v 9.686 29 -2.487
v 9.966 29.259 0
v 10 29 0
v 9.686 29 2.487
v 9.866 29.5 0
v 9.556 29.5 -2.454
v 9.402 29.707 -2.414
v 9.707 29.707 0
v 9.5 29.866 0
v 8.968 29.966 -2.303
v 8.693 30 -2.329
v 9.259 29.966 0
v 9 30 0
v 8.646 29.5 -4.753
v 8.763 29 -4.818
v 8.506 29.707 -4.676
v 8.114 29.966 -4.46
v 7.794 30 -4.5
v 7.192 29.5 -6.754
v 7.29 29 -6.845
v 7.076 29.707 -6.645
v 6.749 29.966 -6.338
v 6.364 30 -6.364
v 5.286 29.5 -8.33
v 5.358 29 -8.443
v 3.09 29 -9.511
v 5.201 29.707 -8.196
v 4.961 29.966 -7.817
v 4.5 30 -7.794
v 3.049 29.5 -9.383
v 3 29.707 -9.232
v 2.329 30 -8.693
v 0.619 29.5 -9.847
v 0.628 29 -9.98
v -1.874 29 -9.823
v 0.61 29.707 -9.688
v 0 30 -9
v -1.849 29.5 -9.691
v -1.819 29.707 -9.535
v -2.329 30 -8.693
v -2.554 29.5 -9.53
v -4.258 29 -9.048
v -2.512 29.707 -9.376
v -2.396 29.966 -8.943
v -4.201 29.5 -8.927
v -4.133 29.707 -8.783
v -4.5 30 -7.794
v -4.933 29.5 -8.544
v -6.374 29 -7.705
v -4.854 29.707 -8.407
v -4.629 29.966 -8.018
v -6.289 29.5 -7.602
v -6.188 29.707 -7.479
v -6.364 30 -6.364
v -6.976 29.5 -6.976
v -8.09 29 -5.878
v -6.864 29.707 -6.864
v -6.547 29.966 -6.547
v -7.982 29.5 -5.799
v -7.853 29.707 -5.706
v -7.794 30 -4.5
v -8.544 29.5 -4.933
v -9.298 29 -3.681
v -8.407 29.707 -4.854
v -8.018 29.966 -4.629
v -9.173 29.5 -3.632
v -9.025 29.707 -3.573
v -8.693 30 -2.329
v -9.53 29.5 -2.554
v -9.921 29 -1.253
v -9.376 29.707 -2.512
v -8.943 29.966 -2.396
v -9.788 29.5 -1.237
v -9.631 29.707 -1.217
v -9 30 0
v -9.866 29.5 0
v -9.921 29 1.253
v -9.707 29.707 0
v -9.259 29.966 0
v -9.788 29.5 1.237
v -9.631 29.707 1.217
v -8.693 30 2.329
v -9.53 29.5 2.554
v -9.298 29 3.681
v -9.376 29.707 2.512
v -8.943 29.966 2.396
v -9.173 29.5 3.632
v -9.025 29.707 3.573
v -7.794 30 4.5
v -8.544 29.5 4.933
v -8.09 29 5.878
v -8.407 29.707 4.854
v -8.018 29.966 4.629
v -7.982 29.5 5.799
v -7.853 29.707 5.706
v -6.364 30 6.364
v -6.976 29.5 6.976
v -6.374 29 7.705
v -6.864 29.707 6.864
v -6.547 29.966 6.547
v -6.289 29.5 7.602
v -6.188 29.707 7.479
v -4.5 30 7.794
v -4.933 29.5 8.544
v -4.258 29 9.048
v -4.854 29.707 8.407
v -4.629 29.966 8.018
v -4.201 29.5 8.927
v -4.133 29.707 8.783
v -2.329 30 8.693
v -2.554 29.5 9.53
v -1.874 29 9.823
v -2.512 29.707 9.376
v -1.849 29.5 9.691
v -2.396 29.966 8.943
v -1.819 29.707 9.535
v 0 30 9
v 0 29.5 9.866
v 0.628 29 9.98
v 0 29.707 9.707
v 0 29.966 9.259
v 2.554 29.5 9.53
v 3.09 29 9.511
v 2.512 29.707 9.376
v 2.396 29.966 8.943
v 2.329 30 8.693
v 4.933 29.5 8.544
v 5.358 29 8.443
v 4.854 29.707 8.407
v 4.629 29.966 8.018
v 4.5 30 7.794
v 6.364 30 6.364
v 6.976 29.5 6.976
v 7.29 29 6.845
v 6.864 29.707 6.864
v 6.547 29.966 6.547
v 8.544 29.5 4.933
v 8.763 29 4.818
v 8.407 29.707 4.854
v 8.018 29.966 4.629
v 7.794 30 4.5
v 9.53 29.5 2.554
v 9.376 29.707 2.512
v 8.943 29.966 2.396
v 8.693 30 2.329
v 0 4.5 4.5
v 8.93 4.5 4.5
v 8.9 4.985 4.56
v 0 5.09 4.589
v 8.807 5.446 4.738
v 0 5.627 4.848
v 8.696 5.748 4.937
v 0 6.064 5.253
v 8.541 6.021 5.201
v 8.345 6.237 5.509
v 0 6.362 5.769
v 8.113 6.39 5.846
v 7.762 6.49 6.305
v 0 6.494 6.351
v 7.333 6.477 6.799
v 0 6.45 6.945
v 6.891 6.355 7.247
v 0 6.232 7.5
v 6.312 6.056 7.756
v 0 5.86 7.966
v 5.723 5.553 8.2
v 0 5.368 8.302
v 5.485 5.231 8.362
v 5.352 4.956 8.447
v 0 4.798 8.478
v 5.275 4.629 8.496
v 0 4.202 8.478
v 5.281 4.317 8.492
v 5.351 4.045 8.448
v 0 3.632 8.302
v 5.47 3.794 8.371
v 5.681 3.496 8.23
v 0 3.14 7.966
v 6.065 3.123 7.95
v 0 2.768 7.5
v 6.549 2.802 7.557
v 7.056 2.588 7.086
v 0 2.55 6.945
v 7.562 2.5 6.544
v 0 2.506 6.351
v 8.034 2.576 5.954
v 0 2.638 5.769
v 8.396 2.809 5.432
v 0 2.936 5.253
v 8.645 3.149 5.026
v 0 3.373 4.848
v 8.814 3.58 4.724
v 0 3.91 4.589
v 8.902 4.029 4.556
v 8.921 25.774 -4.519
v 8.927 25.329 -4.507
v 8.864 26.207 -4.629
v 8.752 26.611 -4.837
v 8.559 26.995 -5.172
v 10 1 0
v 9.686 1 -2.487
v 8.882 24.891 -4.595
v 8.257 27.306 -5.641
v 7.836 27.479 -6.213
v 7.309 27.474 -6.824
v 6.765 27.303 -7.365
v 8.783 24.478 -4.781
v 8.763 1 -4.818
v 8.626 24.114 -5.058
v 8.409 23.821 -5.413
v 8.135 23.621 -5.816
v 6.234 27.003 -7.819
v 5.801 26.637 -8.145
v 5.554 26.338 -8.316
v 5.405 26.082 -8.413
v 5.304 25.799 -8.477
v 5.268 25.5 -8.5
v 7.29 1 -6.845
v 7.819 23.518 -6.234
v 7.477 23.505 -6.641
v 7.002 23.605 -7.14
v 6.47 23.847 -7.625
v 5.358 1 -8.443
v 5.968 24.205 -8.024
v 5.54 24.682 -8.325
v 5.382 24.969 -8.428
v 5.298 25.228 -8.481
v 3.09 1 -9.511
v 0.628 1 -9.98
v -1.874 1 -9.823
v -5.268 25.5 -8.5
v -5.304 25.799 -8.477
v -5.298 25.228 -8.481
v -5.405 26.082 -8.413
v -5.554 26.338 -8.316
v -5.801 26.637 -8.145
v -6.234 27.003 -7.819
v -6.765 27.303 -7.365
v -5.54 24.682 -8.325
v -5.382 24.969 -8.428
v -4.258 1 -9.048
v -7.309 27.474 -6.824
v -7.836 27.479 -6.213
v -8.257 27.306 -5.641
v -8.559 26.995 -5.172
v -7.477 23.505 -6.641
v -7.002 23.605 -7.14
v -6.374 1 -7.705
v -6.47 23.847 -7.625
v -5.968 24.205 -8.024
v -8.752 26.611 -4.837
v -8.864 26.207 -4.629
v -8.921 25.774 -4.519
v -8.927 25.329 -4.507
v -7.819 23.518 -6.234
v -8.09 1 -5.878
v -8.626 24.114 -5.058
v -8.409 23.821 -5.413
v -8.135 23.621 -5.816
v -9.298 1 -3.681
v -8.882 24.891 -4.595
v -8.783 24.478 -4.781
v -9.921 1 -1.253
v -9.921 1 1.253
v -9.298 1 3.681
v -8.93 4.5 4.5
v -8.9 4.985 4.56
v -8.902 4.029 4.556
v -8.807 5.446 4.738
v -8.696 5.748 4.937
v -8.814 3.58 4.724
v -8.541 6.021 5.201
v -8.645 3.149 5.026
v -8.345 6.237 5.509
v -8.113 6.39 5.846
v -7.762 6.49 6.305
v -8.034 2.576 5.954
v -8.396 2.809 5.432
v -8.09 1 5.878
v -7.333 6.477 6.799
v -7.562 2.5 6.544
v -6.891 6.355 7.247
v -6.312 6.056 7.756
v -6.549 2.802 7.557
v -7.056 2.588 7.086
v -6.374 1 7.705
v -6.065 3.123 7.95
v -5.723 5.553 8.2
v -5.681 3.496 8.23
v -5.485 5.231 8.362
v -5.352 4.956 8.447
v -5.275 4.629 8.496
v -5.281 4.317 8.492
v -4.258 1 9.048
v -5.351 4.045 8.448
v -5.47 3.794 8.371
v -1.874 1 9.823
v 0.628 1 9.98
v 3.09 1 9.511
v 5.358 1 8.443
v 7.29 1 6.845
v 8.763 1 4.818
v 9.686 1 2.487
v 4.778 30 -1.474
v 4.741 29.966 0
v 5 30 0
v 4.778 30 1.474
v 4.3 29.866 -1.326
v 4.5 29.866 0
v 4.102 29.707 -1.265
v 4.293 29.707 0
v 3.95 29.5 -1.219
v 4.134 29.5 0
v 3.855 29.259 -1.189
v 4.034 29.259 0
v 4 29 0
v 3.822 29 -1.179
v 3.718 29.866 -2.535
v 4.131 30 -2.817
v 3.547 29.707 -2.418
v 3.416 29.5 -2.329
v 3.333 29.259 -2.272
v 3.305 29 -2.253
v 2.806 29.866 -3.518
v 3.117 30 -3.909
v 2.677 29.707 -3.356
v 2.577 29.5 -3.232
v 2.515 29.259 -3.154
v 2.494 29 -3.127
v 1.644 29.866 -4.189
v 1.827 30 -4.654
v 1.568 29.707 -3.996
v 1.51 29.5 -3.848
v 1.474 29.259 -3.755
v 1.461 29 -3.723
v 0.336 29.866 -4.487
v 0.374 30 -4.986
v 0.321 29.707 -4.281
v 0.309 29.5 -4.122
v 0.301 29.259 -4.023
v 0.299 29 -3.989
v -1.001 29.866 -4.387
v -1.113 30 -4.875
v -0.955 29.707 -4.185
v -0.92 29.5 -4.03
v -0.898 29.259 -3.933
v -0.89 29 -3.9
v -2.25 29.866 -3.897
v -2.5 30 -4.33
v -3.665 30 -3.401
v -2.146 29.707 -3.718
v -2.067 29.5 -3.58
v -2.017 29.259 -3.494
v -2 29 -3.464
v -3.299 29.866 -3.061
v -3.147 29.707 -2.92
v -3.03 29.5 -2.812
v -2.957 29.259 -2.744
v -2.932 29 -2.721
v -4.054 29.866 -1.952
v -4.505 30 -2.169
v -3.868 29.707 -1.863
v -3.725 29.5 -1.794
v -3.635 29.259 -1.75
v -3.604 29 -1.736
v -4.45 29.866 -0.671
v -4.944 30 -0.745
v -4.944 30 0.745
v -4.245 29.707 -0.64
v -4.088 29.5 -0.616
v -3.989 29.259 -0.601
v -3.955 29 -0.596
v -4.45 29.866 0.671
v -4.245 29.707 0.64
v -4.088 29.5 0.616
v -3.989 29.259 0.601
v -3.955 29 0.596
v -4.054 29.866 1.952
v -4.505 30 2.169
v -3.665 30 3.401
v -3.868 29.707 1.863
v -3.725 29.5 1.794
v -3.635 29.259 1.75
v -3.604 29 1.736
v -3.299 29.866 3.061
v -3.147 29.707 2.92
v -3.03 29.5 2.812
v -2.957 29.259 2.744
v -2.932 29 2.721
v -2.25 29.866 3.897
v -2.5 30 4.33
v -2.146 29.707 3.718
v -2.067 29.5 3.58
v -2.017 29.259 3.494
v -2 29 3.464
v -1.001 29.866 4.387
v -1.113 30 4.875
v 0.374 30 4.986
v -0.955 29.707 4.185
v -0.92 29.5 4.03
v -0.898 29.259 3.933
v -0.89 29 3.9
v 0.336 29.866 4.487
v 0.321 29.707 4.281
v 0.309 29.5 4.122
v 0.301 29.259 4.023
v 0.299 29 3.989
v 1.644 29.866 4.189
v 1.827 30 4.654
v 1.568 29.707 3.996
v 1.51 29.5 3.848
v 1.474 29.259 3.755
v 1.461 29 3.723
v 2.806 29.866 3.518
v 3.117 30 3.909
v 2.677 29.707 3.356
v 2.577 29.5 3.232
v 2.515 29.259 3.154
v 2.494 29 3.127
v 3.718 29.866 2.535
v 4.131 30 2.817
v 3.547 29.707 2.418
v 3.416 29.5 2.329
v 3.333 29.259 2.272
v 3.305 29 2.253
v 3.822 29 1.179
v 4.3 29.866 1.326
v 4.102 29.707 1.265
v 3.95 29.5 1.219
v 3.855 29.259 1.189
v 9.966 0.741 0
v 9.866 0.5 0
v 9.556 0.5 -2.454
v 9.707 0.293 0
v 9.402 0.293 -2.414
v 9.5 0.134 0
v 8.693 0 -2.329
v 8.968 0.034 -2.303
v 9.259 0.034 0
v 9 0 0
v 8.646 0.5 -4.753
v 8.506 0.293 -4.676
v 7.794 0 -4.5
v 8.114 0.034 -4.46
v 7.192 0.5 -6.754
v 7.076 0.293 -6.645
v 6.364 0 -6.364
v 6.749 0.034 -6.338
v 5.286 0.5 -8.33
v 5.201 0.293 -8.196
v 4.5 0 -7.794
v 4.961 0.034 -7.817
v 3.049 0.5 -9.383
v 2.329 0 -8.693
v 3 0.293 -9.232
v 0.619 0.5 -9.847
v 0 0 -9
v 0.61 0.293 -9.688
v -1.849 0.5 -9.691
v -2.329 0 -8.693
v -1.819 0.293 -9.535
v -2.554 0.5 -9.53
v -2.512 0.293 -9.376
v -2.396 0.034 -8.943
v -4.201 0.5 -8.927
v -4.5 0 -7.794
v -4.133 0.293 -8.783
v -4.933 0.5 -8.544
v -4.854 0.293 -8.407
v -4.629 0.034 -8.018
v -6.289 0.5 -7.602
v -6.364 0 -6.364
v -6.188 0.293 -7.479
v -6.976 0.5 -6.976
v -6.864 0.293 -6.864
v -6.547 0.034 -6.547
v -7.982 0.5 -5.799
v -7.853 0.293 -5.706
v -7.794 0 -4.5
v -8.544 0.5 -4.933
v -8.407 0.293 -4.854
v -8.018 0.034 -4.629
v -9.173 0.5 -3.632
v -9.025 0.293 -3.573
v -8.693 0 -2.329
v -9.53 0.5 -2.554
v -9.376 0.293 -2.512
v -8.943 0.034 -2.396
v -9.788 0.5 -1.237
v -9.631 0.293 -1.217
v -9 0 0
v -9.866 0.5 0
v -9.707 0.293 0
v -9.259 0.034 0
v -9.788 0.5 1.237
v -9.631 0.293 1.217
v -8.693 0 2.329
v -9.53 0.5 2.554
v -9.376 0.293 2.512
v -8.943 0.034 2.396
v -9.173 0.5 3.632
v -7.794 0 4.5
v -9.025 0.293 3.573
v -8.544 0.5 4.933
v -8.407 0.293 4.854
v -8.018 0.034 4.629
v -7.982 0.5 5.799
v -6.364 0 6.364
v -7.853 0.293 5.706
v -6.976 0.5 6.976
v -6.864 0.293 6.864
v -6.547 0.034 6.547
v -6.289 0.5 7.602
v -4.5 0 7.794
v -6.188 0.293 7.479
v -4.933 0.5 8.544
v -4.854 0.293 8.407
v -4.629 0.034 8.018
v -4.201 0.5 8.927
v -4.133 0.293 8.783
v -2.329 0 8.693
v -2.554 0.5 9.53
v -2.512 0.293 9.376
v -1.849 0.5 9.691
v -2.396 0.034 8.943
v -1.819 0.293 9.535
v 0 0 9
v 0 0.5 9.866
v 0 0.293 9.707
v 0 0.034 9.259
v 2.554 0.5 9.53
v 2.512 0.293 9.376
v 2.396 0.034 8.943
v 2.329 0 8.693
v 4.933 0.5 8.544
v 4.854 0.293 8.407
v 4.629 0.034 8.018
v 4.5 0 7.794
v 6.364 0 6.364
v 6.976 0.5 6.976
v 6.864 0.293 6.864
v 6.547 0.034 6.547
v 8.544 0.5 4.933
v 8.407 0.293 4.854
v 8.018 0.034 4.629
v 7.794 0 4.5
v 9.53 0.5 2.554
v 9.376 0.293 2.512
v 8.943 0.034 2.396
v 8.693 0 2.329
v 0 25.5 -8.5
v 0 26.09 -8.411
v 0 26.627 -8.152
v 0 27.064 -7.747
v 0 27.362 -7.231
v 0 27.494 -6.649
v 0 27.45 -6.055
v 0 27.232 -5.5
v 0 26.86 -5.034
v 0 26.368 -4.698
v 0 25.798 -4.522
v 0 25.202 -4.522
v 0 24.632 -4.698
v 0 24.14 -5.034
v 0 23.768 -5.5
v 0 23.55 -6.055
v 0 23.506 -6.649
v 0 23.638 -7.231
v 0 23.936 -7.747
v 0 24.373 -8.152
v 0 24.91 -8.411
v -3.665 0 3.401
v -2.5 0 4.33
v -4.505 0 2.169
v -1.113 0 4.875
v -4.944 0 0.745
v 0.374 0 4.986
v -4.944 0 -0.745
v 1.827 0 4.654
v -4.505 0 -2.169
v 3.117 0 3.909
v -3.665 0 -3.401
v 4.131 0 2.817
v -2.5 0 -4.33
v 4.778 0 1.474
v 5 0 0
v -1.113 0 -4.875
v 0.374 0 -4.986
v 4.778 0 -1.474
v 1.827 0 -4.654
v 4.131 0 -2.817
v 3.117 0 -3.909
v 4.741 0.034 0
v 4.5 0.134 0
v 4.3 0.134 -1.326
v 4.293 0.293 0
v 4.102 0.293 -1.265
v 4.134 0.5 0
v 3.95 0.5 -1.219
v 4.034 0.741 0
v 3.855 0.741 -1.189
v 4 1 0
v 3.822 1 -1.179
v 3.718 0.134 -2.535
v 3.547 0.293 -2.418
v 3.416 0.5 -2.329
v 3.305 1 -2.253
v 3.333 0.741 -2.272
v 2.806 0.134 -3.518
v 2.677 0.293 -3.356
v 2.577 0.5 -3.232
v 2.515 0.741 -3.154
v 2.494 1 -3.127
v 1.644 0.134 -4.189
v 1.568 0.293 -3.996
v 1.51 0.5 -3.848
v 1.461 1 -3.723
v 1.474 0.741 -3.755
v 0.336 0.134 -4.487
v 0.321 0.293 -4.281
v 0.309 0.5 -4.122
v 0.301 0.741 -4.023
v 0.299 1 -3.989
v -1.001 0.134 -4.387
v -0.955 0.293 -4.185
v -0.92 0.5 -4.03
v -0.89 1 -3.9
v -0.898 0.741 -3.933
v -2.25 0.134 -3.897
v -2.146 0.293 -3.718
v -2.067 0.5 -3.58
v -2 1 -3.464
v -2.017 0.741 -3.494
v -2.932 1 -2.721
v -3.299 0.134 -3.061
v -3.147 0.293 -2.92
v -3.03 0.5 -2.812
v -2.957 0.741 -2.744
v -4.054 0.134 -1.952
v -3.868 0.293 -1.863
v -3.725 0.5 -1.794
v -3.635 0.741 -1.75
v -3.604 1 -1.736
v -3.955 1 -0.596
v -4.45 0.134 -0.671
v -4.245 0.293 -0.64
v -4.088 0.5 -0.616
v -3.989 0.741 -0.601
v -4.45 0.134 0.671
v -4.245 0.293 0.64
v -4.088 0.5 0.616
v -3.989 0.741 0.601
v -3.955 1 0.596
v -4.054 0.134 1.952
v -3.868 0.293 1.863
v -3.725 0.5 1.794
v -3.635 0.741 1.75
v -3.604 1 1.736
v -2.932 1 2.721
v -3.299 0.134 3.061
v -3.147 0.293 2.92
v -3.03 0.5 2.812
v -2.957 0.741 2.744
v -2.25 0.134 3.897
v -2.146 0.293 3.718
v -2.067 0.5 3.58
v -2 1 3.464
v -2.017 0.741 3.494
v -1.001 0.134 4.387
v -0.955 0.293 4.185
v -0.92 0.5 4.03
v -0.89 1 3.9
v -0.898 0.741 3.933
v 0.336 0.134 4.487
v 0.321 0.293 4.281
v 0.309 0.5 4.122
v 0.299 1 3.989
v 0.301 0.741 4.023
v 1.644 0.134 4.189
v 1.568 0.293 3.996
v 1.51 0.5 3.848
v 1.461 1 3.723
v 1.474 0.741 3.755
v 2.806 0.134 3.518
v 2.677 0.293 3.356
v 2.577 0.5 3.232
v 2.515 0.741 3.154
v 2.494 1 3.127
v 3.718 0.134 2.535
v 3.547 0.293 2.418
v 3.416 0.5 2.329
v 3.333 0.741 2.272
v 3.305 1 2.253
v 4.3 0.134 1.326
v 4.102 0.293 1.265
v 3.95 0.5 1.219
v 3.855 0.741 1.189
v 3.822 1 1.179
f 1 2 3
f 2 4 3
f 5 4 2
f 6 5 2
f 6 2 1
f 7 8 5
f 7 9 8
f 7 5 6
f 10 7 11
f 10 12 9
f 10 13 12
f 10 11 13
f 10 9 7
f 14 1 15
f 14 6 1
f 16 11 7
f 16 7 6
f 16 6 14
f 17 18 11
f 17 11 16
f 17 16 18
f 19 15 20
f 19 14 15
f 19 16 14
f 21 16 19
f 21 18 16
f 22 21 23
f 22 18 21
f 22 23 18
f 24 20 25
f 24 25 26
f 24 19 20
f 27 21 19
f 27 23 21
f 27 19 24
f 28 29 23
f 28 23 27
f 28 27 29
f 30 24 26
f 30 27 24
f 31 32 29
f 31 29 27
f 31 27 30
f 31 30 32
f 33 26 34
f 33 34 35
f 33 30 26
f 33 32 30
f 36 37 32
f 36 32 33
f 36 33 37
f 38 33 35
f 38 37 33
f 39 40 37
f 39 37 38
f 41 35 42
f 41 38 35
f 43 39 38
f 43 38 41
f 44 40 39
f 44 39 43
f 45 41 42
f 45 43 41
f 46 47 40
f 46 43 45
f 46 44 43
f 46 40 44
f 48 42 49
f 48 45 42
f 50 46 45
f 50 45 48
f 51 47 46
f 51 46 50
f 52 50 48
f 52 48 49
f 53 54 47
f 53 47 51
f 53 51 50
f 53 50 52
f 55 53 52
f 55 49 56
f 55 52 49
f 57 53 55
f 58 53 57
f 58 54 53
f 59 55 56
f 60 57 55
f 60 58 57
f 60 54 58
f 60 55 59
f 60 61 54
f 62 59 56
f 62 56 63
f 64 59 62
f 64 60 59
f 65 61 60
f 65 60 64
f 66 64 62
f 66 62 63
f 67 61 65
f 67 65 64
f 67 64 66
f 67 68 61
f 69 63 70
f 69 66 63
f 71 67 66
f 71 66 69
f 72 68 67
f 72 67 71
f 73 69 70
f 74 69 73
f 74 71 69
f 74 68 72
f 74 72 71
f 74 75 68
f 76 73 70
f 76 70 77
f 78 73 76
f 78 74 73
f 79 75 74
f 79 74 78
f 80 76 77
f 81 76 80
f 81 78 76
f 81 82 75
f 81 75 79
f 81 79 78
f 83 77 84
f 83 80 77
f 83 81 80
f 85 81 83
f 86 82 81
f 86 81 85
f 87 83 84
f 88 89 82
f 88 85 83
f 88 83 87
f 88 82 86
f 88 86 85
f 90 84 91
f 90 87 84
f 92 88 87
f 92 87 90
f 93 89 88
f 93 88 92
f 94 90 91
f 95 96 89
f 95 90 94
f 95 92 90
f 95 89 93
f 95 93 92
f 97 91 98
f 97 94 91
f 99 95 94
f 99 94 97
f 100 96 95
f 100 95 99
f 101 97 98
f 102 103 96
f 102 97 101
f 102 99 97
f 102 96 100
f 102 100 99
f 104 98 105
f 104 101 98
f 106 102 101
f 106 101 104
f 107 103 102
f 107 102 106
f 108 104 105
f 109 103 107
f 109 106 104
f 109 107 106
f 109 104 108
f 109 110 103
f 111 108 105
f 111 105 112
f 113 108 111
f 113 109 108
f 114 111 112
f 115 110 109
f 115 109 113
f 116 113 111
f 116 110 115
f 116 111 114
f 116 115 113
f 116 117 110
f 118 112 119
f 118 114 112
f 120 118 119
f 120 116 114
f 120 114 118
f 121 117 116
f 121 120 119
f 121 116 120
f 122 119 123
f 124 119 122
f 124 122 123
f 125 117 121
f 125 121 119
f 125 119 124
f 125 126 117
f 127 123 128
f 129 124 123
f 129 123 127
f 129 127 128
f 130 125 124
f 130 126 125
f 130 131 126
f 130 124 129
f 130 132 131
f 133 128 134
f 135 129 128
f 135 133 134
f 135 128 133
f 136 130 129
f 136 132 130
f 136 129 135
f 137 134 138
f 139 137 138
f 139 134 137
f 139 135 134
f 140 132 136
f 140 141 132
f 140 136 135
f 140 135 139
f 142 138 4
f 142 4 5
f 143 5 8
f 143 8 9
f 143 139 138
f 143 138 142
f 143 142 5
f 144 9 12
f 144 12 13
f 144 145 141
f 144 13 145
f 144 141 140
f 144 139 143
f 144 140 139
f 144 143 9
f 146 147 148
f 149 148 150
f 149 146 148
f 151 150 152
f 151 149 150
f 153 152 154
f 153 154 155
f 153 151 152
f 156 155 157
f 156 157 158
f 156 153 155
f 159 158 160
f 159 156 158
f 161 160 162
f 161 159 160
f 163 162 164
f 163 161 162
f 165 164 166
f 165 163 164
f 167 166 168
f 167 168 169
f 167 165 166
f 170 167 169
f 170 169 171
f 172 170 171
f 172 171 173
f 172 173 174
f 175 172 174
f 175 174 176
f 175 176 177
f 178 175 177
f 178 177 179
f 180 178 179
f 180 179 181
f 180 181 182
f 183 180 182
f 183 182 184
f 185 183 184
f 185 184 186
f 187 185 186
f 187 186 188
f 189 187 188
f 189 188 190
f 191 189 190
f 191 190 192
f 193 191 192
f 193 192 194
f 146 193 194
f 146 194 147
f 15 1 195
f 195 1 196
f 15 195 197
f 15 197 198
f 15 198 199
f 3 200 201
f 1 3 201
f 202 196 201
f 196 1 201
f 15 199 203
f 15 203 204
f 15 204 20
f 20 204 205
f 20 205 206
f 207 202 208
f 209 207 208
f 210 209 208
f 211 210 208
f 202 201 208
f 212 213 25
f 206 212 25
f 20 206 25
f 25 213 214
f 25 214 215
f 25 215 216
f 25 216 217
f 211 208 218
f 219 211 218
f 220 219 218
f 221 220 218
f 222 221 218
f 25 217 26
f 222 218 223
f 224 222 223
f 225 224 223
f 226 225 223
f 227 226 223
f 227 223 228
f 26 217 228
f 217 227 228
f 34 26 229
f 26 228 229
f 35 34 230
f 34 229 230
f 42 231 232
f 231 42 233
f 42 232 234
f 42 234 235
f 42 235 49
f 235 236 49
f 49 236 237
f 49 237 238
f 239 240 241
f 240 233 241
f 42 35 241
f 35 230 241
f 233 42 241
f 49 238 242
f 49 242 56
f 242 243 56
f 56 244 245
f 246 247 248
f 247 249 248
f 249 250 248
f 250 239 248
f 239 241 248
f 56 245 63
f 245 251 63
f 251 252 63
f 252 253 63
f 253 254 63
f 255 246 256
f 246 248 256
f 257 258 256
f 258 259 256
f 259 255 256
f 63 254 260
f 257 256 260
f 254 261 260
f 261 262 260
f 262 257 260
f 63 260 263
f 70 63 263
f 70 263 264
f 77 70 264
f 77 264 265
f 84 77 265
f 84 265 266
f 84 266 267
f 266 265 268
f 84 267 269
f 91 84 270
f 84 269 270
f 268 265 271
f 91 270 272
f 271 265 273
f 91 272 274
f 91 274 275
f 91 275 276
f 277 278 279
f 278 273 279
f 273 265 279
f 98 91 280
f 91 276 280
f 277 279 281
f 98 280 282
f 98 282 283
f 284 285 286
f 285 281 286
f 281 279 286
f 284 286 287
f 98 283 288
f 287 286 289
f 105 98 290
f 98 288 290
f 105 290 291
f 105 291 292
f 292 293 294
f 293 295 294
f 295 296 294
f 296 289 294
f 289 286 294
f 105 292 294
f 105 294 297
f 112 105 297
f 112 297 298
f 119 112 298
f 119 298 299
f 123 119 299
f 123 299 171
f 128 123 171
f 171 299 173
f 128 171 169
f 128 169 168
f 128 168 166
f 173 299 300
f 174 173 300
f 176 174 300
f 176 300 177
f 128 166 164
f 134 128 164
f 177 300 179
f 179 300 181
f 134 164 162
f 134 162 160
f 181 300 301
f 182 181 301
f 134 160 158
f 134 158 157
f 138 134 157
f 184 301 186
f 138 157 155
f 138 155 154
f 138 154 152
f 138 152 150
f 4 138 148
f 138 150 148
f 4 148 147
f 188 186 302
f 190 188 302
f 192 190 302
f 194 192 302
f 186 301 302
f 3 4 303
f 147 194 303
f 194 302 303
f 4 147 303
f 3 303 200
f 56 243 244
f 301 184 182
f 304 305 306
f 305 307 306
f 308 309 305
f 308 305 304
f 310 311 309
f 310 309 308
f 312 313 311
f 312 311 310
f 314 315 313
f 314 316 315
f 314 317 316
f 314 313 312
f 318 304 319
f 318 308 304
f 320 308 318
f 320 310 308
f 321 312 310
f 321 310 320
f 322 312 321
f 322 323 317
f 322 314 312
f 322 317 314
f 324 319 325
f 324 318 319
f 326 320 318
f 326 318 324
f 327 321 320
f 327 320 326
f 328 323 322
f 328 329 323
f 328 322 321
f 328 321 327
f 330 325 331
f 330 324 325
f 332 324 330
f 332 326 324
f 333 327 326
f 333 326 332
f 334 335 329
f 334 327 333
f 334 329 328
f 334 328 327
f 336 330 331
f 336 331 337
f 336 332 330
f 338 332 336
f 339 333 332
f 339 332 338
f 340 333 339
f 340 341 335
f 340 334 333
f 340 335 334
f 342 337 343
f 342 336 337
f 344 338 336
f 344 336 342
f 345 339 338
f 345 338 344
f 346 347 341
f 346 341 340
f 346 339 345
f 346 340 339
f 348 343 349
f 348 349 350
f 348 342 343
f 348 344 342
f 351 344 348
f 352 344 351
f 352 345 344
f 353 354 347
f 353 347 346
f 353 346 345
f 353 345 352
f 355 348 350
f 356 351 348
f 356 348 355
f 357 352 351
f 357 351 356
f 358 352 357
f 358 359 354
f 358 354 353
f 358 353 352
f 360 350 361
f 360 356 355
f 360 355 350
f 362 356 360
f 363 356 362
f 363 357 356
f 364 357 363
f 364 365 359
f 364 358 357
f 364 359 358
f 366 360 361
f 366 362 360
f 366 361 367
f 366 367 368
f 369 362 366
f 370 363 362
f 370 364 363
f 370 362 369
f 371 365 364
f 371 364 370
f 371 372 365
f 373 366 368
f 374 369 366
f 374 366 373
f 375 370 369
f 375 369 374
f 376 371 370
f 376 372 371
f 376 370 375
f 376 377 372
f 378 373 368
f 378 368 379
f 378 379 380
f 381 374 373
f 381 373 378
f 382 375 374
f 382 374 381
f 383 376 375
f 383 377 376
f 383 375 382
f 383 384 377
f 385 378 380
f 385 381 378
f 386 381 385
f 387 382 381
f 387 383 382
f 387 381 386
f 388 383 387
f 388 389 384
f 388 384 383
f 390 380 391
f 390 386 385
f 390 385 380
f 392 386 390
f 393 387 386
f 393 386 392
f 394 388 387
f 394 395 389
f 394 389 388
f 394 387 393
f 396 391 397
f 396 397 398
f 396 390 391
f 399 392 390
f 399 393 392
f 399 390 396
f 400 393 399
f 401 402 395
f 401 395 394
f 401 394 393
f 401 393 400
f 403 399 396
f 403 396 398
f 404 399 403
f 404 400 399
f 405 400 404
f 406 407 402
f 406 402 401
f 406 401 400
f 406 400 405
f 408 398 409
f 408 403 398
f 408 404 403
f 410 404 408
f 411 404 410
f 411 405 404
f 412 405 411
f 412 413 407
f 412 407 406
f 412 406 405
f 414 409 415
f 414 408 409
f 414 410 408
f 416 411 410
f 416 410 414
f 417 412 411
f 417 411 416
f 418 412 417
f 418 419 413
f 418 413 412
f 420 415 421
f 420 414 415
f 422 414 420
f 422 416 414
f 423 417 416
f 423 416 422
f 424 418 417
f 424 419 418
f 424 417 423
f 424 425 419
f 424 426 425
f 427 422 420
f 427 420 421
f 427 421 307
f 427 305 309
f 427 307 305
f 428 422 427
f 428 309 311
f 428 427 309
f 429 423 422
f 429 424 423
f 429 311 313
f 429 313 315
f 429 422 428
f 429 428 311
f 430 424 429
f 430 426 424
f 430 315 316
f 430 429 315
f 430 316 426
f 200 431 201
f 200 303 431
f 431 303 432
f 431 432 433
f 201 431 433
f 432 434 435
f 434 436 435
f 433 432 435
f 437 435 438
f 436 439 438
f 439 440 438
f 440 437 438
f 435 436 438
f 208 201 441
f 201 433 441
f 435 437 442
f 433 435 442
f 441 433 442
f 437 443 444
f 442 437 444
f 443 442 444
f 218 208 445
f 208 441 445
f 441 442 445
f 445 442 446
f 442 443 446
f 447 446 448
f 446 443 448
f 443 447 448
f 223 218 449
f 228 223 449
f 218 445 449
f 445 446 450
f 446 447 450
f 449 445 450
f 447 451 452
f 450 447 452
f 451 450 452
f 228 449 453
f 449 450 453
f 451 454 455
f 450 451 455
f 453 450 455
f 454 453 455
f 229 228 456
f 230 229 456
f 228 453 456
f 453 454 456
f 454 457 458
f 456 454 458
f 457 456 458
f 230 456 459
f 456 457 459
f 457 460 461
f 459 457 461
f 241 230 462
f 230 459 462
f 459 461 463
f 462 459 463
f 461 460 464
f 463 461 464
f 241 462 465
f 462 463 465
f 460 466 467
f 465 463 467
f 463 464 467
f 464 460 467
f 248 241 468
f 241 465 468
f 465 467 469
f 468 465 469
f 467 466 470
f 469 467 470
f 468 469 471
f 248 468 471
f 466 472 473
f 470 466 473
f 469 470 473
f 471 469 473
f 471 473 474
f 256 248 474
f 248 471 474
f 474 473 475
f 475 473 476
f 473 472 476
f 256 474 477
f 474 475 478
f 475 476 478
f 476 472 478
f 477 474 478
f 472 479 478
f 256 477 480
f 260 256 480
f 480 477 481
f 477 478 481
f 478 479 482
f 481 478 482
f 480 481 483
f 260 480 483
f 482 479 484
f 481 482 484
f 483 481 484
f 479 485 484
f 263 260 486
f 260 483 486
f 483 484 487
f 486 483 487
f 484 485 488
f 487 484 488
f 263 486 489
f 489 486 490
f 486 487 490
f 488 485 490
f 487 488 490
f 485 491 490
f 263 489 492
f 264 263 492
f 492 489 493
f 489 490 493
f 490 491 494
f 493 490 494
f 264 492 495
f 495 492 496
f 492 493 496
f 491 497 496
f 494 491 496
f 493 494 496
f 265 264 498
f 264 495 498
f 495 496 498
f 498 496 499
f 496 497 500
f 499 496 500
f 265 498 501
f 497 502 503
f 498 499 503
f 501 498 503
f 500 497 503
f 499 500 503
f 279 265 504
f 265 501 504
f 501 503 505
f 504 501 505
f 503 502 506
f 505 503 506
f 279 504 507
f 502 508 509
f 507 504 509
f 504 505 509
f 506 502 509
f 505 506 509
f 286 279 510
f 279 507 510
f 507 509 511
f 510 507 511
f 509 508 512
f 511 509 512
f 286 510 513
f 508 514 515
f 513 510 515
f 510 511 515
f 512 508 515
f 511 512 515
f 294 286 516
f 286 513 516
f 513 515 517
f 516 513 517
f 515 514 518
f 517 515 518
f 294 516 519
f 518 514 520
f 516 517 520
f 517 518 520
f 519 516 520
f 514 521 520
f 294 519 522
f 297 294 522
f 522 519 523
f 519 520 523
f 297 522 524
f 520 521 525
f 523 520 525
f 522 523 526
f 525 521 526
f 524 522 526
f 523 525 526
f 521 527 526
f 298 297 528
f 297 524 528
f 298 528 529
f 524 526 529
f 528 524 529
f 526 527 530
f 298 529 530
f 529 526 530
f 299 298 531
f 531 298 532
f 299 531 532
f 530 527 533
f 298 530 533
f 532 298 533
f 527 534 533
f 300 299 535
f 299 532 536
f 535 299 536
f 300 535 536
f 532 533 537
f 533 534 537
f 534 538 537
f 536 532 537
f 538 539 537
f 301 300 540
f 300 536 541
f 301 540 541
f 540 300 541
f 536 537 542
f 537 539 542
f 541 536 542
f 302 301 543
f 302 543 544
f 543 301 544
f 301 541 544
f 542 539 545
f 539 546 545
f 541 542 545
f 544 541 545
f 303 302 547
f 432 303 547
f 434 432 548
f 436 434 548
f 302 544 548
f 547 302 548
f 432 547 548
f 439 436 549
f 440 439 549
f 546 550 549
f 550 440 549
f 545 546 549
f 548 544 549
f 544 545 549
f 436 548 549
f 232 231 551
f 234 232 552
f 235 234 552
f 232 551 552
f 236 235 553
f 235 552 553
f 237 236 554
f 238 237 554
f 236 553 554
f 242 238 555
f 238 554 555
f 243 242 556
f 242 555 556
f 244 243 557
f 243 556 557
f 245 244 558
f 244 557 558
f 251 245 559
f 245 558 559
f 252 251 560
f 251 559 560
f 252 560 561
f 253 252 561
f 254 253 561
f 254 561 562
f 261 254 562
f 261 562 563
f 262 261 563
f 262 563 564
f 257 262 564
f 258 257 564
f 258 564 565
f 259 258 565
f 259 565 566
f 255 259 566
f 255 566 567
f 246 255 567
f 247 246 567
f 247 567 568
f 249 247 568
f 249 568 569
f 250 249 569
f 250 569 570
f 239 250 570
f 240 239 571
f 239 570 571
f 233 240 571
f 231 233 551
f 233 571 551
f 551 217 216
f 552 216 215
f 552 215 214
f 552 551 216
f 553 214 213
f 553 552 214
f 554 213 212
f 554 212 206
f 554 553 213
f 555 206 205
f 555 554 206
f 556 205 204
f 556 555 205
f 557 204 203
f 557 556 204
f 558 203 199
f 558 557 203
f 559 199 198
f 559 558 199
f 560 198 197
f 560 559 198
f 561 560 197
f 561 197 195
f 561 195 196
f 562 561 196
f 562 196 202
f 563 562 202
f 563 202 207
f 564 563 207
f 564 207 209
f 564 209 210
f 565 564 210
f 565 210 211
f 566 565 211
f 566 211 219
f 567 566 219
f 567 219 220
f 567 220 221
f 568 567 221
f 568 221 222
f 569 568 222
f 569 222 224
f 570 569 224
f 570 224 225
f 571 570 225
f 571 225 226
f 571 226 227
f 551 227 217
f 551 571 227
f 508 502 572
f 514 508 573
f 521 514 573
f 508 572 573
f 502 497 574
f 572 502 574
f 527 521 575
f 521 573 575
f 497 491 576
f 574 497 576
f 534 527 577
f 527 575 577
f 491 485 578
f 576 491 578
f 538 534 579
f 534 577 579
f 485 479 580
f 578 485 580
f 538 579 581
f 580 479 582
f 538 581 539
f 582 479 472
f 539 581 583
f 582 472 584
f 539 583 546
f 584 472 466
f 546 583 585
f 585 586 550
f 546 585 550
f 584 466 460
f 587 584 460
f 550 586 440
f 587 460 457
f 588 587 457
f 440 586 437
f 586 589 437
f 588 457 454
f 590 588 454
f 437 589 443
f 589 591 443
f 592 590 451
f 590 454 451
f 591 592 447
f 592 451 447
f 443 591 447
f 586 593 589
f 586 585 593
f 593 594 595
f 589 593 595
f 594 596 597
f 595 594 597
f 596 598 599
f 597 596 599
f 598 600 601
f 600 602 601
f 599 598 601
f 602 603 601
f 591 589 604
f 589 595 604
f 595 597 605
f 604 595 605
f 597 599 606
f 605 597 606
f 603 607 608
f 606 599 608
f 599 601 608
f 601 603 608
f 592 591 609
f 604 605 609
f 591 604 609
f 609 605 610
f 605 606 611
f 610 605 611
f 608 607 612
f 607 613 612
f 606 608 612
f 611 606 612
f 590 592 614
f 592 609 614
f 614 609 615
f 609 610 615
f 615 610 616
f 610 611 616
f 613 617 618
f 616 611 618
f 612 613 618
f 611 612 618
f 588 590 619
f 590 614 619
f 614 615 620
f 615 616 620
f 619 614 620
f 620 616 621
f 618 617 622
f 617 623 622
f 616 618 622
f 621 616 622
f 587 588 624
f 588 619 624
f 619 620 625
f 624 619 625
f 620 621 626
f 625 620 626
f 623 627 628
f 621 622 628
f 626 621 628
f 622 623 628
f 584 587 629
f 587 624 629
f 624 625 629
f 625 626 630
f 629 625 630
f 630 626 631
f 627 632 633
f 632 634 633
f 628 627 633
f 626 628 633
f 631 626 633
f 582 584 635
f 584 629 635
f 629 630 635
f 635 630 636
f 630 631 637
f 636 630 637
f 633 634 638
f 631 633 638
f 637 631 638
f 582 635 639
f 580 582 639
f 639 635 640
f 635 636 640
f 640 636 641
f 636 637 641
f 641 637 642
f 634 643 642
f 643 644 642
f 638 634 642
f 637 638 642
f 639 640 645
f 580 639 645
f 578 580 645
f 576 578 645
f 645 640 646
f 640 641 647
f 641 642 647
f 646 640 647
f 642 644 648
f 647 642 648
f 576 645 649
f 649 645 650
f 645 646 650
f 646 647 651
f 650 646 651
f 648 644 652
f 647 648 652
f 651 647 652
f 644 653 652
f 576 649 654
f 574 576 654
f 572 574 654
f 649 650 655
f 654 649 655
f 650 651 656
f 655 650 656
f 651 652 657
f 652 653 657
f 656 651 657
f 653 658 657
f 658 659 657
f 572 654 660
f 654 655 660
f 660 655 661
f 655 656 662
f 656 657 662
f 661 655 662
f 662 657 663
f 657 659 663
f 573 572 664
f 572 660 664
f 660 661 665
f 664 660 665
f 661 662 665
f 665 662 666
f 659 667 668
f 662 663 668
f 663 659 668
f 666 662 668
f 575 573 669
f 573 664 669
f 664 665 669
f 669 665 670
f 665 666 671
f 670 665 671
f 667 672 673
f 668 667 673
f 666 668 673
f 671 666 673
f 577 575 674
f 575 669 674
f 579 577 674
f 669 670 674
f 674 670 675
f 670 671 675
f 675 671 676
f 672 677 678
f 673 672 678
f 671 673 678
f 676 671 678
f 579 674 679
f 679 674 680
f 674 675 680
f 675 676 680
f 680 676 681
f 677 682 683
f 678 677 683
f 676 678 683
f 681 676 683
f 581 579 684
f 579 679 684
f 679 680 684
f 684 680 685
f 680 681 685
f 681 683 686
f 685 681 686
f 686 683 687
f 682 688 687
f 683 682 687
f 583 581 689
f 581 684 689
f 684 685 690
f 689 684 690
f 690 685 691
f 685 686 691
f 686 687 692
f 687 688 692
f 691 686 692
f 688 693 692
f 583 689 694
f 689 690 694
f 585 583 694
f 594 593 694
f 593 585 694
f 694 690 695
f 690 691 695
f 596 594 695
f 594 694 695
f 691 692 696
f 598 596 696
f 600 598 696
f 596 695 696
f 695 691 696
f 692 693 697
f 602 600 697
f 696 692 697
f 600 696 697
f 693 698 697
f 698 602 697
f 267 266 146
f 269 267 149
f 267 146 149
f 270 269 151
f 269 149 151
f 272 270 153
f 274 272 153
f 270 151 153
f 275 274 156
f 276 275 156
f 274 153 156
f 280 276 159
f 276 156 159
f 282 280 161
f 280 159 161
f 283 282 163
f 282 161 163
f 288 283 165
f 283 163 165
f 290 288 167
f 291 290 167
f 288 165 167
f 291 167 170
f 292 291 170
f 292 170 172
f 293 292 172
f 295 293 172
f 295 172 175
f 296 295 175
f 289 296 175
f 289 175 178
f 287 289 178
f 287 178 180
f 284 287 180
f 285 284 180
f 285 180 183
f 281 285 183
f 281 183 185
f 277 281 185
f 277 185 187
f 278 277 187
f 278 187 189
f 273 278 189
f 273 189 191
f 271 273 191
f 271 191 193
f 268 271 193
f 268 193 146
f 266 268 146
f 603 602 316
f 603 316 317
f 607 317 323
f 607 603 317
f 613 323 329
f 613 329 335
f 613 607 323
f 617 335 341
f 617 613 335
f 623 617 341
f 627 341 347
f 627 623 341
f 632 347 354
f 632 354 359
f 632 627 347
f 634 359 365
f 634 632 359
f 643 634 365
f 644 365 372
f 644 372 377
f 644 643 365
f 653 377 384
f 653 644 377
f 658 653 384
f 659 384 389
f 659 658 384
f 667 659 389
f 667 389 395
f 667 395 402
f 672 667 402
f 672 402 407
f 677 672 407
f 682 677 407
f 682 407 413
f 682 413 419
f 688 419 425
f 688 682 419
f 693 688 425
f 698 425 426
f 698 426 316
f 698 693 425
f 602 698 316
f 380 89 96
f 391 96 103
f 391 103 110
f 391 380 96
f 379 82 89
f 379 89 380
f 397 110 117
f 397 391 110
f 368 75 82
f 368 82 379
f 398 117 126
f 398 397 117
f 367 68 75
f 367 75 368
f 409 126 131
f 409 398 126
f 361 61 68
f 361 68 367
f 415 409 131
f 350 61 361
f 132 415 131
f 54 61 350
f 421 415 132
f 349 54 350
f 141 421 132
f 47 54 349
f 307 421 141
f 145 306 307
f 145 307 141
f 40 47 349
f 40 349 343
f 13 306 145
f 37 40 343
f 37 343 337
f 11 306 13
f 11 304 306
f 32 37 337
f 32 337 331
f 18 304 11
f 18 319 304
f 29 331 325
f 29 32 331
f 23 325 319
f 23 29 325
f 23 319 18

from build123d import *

# Parameters (mm, degrees)
SKETCH1_R               = 10
SKETCH1_R_2             = 4
BOSS_EXTRUDE1_DEPTH     = 30
SKETCH2_R               = 2
CUT_EXTRUDE1_DEPTH      = 11
CUT_EXTRUDE1_DEPTH_BACK = 11
FILLET1_R               = 1


with BuildPart() as part:
    # Sketch1 → Boss-Extrude1 (new body)
    with BuildSketch(Plane(origin=(0, 0, 0), x_dir=(1, 0, 0), z_dir=(0, 1, 0))):
        Circle(SKETCH1_R)
        Circle(SKETCH1_R_2, mode=Mode.SUBTRACT)
    extrude(amount=BOSS_EXTRUDE1_DEPTH)

    # Sketch2 → Cut-Extrude1 (cut, two sides)
    with BuildSketch(Plane(origin=(0, 0, 0), x_dir=(0, 0, -1), z_dir=(1, 0, 0))) as cut_extrude1_sk:
        with Locations((6.5, 25.5)):
            Circle(SKETCH2_R)
        with Locations((-6.5, 4.5)):
            Circle(SKETCH2_R)
    extrude(amount=CUT_EXTRUDE1_DEPTH, mode=Mode.SUBTRACT)
    extrude(cut_extrude1_sk.sketch, amount=-CUT_EXTRUDE1_DEPTH_BACK, mode=Mode.SUBTRACT)

    # Fillet1
    fillet1_edges = [part.edges().sort_by_distance(p)[0] for p in [
        (-10, 0, 0),
        (-10, 30, 0),
        (-4, 0, 0),
        (-4, 30, 0),
    ]]
    fillet(fillet1_edges, radius=FILLET1_R)


solid = part.part
